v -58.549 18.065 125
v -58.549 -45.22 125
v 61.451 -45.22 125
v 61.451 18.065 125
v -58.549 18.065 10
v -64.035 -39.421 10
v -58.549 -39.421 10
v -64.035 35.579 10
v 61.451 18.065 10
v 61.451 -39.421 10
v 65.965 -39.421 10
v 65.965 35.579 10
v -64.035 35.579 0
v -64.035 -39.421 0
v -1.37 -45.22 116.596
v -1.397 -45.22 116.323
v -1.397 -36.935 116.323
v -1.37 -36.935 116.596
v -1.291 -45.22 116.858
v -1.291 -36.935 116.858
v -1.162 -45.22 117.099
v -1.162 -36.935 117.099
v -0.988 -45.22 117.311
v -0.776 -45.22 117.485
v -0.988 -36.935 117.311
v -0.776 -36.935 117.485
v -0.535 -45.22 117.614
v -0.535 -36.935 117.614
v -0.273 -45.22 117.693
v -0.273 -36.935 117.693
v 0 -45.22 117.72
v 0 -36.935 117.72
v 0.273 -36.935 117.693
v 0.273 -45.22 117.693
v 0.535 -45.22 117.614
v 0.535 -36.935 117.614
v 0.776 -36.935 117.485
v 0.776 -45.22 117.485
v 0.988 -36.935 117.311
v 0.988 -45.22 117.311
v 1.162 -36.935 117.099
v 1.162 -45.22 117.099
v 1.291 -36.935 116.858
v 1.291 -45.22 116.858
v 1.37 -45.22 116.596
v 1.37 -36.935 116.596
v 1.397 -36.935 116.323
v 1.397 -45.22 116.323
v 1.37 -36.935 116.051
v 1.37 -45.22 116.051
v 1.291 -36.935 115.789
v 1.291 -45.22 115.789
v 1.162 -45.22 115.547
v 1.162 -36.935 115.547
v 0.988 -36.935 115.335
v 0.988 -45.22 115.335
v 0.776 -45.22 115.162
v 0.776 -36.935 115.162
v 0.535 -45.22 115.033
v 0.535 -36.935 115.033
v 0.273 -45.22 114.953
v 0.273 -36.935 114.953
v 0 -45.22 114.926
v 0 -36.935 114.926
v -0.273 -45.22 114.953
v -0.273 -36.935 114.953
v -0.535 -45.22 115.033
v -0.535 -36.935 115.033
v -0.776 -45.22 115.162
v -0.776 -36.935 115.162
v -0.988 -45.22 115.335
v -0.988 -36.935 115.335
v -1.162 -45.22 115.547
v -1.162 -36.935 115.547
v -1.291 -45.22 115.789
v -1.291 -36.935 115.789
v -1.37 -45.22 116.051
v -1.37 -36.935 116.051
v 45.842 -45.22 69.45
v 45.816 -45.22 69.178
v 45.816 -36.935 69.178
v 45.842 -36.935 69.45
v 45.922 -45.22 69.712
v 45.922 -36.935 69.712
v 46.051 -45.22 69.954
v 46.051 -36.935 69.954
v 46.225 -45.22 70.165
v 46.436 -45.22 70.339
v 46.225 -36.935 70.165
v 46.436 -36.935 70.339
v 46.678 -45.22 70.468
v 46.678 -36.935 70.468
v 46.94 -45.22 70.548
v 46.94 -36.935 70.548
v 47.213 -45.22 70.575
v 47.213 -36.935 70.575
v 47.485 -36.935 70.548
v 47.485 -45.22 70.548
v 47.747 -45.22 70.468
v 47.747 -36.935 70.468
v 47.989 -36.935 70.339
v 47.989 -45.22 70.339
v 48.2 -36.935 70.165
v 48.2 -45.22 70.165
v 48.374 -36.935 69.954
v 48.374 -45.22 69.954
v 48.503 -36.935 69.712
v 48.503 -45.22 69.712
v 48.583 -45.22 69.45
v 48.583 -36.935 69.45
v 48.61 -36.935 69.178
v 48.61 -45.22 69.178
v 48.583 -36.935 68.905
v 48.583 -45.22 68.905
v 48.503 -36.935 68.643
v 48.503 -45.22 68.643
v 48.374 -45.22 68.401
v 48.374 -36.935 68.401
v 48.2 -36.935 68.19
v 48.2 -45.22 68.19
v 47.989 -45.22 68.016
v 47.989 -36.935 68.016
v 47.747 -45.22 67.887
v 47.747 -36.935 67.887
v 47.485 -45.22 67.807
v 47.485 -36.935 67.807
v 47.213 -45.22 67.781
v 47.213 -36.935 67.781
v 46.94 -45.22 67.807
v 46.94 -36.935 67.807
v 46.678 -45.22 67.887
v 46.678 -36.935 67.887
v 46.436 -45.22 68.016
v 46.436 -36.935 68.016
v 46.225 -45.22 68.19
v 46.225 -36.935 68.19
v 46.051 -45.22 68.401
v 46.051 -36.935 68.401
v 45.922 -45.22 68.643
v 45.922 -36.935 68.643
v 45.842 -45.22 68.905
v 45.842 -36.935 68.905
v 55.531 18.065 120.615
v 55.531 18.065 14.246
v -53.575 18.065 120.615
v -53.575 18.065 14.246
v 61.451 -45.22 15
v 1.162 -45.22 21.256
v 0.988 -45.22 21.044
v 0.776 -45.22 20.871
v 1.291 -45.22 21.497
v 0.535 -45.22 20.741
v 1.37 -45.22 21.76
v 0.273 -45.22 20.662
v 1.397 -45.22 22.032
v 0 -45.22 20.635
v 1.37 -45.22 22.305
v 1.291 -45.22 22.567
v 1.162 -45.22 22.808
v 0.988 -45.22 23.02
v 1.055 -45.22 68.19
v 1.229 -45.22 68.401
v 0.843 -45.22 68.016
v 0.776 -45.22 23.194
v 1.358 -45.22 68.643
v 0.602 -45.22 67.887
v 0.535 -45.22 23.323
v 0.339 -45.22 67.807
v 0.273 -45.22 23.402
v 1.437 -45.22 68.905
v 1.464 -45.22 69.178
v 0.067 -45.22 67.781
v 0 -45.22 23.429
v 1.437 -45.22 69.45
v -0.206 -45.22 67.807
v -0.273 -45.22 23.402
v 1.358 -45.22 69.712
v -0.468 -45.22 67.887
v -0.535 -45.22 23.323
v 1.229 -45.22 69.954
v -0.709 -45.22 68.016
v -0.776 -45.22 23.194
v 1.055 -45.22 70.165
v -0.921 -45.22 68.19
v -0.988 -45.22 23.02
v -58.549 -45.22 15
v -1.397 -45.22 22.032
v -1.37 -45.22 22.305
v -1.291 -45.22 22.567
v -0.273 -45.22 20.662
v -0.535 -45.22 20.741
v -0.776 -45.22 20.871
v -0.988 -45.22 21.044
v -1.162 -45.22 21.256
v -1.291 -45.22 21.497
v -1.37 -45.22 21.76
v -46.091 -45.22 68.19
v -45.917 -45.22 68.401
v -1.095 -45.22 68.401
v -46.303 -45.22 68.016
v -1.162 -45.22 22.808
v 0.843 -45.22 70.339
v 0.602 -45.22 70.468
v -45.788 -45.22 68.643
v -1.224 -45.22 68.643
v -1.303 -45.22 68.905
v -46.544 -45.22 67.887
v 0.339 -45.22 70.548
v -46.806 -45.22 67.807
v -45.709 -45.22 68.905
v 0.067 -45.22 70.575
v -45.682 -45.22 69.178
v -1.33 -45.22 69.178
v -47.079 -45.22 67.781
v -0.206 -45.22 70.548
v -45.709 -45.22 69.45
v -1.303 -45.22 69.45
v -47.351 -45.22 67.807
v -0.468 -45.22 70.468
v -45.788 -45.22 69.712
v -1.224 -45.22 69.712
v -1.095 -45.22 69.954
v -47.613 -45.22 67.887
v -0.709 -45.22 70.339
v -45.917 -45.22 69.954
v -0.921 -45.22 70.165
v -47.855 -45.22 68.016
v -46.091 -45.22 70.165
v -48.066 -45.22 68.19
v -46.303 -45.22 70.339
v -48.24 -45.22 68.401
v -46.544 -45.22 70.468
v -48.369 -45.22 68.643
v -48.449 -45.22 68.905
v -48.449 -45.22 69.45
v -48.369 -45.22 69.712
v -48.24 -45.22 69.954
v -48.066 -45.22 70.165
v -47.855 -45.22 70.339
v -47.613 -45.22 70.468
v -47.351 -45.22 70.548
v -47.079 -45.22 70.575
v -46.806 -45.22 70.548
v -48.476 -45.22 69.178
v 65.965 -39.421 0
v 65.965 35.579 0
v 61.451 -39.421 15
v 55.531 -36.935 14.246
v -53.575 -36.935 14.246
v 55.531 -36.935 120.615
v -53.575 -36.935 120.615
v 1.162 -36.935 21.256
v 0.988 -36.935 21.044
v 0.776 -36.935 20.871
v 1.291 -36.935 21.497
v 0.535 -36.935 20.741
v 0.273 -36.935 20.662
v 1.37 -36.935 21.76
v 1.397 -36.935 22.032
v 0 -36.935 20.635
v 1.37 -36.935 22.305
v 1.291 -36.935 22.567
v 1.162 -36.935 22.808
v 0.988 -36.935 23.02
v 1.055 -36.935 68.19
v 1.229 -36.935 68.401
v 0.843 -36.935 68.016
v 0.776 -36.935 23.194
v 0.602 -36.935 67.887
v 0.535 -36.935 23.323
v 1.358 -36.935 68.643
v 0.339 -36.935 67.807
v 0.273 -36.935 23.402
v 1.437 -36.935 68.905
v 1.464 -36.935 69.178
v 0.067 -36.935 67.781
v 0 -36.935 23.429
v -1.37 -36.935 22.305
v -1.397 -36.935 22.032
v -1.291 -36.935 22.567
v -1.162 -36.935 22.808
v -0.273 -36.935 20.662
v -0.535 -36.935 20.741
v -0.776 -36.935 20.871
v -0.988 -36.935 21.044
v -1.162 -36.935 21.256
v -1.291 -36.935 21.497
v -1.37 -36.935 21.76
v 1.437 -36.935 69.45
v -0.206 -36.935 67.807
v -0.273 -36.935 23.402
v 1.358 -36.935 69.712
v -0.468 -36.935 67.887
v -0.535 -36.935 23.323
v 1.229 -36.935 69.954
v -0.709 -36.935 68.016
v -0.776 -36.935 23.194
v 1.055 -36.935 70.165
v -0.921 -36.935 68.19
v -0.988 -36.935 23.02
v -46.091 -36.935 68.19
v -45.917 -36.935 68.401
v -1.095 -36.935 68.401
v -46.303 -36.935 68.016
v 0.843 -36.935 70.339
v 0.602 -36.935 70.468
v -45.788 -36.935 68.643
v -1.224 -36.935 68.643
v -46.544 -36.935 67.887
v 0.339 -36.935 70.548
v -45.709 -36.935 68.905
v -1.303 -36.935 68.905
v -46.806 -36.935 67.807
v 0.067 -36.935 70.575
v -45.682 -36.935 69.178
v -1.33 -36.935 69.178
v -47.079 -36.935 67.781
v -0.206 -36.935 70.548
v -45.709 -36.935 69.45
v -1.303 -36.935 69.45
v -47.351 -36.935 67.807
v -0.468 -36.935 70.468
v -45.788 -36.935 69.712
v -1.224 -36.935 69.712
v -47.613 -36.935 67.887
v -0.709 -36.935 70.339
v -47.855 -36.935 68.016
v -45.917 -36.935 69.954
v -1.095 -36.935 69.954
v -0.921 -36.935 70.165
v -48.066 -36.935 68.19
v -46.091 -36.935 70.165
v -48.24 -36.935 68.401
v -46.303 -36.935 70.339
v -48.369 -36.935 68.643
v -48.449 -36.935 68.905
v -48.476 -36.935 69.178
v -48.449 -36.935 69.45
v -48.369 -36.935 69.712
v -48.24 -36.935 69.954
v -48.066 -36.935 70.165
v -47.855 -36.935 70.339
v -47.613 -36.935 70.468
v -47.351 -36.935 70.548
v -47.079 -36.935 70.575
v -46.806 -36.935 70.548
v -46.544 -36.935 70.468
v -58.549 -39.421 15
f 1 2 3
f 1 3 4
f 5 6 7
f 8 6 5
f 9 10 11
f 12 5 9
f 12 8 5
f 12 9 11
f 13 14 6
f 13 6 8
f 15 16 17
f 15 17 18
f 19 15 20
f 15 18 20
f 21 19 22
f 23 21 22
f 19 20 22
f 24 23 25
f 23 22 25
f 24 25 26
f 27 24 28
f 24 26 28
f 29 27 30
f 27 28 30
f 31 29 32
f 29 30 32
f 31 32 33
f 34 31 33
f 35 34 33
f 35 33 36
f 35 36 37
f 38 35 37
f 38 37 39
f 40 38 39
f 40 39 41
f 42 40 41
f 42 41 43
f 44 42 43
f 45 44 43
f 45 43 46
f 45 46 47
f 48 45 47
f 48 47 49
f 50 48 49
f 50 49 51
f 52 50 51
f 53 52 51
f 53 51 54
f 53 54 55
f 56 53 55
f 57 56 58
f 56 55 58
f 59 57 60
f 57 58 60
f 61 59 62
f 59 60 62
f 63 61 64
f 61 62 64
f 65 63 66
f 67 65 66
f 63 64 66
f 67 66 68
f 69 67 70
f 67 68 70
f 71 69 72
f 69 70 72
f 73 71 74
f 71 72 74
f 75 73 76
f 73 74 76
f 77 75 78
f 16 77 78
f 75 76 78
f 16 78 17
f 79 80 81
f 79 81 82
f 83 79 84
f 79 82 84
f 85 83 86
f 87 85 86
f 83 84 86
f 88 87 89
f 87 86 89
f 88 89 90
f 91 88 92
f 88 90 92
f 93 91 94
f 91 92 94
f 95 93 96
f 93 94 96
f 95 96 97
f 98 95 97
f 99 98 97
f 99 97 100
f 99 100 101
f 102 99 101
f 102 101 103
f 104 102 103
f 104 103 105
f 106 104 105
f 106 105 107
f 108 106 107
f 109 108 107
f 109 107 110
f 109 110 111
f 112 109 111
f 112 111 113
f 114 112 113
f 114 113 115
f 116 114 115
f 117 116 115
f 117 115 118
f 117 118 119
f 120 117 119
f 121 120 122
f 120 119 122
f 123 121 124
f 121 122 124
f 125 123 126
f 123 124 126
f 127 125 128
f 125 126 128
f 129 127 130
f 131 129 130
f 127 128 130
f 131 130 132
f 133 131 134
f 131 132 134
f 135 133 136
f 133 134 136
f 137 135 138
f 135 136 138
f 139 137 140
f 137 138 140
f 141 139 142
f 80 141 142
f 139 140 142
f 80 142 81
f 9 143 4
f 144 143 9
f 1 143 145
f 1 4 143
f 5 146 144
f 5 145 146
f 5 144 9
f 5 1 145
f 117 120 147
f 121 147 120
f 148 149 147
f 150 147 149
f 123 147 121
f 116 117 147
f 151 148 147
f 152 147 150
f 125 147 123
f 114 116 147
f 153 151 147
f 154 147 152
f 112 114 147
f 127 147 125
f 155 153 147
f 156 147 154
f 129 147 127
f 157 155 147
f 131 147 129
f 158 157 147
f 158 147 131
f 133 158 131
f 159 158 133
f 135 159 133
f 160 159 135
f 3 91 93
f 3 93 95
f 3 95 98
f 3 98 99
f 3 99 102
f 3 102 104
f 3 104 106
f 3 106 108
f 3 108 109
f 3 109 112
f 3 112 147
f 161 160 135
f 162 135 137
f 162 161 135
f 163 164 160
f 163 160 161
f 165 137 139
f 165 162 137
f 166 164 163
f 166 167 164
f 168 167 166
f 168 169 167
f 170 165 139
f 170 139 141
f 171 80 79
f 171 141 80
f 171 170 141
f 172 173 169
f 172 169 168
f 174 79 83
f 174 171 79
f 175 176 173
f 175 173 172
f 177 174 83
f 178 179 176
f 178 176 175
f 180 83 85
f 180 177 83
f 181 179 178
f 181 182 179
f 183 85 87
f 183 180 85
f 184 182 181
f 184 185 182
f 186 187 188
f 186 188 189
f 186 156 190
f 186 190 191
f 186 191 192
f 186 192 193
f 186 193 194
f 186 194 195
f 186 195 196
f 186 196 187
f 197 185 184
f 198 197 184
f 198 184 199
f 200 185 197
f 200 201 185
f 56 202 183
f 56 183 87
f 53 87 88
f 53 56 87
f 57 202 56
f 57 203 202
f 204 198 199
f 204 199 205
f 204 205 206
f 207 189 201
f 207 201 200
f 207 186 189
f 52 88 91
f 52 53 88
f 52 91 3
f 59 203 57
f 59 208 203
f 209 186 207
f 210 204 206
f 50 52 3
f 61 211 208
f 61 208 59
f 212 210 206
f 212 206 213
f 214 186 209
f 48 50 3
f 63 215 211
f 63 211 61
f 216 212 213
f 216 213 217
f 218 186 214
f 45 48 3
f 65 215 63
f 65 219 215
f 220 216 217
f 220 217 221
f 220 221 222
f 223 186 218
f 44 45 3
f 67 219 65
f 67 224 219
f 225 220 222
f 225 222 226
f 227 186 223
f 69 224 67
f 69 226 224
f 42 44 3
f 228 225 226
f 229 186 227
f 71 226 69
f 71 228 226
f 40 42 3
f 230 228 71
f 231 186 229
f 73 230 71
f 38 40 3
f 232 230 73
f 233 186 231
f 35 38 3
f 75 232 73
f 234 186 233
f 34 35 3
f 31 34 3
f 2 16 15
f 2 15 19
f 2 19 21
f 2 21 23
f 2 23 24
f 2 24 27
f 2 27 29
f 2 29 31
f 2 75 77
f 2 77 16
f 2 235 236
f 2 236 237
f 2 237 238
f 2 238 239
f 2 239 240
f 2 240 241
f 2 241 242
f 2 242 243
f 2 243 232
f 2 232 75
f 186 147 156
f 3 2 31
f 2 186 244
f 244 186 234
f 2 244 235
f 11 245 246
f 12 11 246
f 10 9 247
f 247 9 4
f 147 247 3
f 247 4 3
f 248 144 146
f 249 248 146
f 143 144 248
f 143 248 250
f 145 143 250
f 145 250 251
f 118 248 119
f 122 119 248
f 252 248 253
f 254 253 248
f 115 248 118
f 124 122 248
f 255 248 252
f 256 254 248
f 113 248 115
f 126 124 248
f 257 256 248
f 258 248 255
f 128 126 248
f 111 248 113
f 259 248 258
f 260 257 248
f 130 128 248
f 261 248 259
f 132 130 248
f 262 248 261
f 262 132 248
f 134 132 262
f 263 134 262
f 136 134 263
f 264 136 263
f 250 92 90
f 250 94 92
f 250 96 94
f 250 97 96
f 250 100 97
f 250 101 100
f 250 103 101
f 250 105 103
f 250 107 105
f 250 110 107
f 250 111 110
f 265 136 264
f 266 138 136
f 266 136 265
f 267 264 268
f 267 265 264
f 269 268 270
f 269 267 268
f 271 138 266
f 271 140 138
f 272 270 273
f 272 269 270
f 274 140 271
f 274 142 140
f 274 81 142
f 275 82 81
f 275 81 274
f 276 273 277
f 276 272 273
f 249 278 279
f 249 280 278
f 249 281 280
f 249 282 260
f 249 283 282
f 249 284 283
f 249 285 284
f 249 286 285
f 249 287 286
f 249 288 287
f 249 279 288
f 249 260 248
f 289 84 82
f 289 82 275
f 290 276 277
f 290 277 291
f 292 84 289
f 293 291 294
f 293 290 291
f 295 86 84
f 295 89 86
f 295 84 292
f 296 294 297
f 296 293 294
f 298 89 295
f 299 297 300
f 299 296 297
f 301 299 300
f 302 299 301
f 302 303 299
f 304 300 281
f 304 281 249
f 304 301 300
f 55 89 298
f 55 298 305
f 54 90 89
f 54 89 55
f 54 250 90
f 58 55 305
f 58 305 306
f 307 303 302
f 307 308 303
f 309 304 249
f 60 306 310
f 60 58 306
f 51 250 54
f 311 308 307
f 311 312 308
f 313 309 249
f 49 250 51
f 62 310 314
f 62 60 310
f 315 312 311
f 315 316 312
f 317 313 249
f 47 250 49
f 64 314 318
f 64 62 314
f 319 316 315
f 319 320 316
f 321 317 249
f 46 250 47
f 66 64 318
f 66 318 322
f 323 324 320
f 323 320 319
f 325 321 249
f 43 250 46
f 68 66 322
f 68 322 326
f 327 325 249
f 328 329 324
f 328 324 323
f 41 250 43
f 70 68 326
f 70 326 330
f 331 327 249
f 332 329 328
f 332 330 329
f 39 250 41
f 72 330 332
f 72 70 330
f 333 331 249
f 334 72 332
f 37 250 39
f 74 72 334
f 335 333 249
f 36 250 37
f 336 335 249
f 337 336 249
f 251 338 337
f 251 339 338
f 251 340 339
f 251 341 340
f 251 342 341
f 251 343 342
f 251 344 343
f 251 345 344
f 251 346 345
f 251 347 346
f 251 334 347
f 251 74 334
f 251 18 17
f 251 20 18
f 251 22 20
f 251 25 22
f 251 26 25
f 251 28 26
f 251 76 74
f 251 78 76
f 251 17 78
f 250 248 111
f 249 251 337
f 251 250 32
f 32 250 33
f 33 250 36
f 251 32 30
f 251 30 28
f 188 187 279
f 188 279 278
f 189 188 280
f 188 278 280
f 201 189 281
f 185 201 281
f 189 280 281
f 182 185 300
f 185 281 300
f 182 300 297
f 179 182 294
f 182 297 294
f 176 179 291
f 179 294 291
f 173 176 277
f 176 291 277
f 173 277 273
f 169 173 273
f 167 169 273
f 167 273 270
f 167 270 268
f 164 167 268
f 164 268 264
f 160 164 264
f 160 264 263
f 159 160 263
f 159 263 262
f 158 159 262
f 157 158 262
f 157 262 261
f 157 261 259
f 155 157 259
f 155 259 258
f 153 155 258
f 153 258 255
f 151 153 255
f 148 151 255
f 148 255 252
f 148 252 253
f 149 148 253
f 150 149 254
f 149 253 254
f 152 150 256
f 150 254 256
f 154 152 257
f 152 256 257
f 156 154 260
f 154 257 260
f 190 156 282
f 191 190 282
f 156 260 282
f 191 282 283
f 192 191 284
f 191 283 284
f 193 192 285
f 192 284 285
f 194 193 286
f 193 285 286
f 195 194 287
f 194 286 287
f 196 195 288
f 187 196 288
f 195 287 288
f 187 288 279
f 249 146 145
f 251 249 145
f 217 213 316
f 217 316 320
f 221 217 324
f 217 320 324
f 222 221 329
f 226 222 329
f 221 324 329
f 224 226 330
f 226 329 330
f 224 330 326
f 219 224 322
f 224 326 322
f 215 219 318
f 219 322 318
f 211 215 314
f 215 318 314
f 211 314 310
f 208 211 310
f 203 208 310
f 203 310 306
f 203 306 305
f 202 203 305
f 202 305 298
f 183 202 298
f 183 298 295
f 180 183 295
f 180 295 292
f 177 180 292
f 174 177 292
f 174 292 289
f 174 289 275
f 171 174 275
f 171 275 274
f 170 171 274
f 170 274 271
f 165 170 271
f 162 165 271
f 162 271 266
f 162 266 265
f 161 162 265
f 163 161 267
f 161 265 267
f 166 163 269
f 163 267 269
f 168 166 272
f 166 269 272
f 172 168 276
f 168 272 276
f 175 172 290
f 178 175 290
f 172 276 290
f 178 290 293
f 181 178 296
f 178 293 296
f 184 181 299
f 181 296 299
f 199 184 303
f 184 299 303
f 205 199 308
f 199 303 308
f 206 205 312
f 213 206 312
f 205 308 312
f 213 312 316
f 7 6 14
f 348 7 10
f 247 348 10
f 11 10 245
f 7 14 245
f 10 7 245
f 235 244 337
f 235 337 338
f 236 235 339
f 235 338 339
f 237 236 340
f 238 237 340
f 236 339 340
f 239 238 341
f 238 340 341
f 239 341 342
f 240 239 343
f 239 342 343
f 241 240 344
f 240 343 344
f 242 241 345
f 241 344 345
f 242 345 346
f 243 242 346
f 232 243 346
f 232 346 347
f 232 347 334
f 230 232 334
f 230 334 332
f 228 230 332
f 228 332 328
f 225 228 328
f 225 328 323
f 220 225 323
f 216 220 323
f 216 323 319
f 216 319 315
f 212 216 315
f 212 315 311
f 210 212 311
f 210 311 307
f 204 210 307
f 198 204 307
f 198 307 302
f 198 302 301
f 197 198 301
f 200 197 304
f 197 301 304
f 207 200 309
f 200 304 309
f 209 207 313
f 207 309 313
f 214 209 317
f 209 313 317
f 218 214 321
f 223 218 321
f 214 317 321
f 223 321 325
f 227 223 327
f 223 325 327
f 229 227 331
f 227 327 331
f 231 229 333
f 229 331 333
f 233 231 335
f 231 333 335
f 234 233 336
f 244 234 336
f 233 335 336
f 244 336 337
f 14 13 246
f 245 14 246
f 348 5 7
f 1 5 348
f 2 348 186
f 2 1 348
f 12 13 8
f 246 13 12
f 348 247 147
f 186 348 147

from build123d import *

# Parameters (mm, degrees)
F0_W     = 130
F0_H     = 75
F1_DEPTH = 10
F2_W     = 120
F2_H     = 57.4860367924
F3_DEPTH = 5
F5_DEPTH = 120
F7_D     = 2.794
F8_W     = 109.1061495245
F8_H     = 106.3687205315
F8_R     = 1.397
F9_DEPTH = 55


with BuildPart() as f1:
    # F0 (on Top) → F1 (new body)
    with BuildSketch(Plane.XY):
        with Locations((0.9653219581, -1.9211560488)):
            Rectangle(F0_W, F0_H)
    extrude(amount=F1_DEPTH)

    # F2 (on face) → F3 (join)
    with BuildSketch(Plane.XY.offset(10)):
        with Locations((1.4508789778, -10.6781376526)):
            Rectangle(F2_W, F2_H)
    extrude(amount=F3_DEPTH)

    # F4 (on face) → F5 (join)
    with BuildSketch(Plane(origin=(-58.5491210222, 0, 0), x_dir=(0, -1, 0), z_dir=(-1, 0, 0))):
        Polygon((-18.0648807436, 125), (-18.0648807436, 15), (39.4211560488, 15), (45.2204495668, 15), (45.2204495668, 125), align=None)
    extrude(amount=-F5_DEPTH)

    # F7 (through all)
    with Locations(Plane.XZ.offset(45.2204495668)):
        with Locations((0, 116.3231828261), (-47.0786592322, 69.1776266678), (0, 22.0320705095), (47.2125481423, 69.1776266678), (0.066944455, 69.1776266678)):
            Hole(F7_D / 2)

    # F8 (on face) → F9 (cut)
    with BuildSketch(Plane(origin=(0, 18.0648807436, 0), x_dir=(-1, 0, 0), z_dir=(0, 1, 0))):
        with Locations((-0.9776521474, 67.4301683903)):
            Rectangle(F8_W, F8_H)
        with Locations((0, 22.0320705095)):
            Circle(F8_R, mode=Mode.SUBTRACT)
        with Locations((-47.2125481423, 69.1776266678)):
            Circle(F8_R, mode=Mode.SUBTRACT)
        with Locations((-0.066944455, 69.1776266678)):
            Circle(F8_R, mode=Mode.SUBTRACT)
        with Locations((47.0786592322, 69.1776266678)):
            Circle(F8_R, mode=Mode.SUBTRACT)
        with Locations((0, 116.3231828261)):
            Circle(F8_R, mode=Mode.SUBTRACT)
    extrude(amount=-F9_DEPTH, mode=Mode.SUBTRACT)


solid = f1.part
